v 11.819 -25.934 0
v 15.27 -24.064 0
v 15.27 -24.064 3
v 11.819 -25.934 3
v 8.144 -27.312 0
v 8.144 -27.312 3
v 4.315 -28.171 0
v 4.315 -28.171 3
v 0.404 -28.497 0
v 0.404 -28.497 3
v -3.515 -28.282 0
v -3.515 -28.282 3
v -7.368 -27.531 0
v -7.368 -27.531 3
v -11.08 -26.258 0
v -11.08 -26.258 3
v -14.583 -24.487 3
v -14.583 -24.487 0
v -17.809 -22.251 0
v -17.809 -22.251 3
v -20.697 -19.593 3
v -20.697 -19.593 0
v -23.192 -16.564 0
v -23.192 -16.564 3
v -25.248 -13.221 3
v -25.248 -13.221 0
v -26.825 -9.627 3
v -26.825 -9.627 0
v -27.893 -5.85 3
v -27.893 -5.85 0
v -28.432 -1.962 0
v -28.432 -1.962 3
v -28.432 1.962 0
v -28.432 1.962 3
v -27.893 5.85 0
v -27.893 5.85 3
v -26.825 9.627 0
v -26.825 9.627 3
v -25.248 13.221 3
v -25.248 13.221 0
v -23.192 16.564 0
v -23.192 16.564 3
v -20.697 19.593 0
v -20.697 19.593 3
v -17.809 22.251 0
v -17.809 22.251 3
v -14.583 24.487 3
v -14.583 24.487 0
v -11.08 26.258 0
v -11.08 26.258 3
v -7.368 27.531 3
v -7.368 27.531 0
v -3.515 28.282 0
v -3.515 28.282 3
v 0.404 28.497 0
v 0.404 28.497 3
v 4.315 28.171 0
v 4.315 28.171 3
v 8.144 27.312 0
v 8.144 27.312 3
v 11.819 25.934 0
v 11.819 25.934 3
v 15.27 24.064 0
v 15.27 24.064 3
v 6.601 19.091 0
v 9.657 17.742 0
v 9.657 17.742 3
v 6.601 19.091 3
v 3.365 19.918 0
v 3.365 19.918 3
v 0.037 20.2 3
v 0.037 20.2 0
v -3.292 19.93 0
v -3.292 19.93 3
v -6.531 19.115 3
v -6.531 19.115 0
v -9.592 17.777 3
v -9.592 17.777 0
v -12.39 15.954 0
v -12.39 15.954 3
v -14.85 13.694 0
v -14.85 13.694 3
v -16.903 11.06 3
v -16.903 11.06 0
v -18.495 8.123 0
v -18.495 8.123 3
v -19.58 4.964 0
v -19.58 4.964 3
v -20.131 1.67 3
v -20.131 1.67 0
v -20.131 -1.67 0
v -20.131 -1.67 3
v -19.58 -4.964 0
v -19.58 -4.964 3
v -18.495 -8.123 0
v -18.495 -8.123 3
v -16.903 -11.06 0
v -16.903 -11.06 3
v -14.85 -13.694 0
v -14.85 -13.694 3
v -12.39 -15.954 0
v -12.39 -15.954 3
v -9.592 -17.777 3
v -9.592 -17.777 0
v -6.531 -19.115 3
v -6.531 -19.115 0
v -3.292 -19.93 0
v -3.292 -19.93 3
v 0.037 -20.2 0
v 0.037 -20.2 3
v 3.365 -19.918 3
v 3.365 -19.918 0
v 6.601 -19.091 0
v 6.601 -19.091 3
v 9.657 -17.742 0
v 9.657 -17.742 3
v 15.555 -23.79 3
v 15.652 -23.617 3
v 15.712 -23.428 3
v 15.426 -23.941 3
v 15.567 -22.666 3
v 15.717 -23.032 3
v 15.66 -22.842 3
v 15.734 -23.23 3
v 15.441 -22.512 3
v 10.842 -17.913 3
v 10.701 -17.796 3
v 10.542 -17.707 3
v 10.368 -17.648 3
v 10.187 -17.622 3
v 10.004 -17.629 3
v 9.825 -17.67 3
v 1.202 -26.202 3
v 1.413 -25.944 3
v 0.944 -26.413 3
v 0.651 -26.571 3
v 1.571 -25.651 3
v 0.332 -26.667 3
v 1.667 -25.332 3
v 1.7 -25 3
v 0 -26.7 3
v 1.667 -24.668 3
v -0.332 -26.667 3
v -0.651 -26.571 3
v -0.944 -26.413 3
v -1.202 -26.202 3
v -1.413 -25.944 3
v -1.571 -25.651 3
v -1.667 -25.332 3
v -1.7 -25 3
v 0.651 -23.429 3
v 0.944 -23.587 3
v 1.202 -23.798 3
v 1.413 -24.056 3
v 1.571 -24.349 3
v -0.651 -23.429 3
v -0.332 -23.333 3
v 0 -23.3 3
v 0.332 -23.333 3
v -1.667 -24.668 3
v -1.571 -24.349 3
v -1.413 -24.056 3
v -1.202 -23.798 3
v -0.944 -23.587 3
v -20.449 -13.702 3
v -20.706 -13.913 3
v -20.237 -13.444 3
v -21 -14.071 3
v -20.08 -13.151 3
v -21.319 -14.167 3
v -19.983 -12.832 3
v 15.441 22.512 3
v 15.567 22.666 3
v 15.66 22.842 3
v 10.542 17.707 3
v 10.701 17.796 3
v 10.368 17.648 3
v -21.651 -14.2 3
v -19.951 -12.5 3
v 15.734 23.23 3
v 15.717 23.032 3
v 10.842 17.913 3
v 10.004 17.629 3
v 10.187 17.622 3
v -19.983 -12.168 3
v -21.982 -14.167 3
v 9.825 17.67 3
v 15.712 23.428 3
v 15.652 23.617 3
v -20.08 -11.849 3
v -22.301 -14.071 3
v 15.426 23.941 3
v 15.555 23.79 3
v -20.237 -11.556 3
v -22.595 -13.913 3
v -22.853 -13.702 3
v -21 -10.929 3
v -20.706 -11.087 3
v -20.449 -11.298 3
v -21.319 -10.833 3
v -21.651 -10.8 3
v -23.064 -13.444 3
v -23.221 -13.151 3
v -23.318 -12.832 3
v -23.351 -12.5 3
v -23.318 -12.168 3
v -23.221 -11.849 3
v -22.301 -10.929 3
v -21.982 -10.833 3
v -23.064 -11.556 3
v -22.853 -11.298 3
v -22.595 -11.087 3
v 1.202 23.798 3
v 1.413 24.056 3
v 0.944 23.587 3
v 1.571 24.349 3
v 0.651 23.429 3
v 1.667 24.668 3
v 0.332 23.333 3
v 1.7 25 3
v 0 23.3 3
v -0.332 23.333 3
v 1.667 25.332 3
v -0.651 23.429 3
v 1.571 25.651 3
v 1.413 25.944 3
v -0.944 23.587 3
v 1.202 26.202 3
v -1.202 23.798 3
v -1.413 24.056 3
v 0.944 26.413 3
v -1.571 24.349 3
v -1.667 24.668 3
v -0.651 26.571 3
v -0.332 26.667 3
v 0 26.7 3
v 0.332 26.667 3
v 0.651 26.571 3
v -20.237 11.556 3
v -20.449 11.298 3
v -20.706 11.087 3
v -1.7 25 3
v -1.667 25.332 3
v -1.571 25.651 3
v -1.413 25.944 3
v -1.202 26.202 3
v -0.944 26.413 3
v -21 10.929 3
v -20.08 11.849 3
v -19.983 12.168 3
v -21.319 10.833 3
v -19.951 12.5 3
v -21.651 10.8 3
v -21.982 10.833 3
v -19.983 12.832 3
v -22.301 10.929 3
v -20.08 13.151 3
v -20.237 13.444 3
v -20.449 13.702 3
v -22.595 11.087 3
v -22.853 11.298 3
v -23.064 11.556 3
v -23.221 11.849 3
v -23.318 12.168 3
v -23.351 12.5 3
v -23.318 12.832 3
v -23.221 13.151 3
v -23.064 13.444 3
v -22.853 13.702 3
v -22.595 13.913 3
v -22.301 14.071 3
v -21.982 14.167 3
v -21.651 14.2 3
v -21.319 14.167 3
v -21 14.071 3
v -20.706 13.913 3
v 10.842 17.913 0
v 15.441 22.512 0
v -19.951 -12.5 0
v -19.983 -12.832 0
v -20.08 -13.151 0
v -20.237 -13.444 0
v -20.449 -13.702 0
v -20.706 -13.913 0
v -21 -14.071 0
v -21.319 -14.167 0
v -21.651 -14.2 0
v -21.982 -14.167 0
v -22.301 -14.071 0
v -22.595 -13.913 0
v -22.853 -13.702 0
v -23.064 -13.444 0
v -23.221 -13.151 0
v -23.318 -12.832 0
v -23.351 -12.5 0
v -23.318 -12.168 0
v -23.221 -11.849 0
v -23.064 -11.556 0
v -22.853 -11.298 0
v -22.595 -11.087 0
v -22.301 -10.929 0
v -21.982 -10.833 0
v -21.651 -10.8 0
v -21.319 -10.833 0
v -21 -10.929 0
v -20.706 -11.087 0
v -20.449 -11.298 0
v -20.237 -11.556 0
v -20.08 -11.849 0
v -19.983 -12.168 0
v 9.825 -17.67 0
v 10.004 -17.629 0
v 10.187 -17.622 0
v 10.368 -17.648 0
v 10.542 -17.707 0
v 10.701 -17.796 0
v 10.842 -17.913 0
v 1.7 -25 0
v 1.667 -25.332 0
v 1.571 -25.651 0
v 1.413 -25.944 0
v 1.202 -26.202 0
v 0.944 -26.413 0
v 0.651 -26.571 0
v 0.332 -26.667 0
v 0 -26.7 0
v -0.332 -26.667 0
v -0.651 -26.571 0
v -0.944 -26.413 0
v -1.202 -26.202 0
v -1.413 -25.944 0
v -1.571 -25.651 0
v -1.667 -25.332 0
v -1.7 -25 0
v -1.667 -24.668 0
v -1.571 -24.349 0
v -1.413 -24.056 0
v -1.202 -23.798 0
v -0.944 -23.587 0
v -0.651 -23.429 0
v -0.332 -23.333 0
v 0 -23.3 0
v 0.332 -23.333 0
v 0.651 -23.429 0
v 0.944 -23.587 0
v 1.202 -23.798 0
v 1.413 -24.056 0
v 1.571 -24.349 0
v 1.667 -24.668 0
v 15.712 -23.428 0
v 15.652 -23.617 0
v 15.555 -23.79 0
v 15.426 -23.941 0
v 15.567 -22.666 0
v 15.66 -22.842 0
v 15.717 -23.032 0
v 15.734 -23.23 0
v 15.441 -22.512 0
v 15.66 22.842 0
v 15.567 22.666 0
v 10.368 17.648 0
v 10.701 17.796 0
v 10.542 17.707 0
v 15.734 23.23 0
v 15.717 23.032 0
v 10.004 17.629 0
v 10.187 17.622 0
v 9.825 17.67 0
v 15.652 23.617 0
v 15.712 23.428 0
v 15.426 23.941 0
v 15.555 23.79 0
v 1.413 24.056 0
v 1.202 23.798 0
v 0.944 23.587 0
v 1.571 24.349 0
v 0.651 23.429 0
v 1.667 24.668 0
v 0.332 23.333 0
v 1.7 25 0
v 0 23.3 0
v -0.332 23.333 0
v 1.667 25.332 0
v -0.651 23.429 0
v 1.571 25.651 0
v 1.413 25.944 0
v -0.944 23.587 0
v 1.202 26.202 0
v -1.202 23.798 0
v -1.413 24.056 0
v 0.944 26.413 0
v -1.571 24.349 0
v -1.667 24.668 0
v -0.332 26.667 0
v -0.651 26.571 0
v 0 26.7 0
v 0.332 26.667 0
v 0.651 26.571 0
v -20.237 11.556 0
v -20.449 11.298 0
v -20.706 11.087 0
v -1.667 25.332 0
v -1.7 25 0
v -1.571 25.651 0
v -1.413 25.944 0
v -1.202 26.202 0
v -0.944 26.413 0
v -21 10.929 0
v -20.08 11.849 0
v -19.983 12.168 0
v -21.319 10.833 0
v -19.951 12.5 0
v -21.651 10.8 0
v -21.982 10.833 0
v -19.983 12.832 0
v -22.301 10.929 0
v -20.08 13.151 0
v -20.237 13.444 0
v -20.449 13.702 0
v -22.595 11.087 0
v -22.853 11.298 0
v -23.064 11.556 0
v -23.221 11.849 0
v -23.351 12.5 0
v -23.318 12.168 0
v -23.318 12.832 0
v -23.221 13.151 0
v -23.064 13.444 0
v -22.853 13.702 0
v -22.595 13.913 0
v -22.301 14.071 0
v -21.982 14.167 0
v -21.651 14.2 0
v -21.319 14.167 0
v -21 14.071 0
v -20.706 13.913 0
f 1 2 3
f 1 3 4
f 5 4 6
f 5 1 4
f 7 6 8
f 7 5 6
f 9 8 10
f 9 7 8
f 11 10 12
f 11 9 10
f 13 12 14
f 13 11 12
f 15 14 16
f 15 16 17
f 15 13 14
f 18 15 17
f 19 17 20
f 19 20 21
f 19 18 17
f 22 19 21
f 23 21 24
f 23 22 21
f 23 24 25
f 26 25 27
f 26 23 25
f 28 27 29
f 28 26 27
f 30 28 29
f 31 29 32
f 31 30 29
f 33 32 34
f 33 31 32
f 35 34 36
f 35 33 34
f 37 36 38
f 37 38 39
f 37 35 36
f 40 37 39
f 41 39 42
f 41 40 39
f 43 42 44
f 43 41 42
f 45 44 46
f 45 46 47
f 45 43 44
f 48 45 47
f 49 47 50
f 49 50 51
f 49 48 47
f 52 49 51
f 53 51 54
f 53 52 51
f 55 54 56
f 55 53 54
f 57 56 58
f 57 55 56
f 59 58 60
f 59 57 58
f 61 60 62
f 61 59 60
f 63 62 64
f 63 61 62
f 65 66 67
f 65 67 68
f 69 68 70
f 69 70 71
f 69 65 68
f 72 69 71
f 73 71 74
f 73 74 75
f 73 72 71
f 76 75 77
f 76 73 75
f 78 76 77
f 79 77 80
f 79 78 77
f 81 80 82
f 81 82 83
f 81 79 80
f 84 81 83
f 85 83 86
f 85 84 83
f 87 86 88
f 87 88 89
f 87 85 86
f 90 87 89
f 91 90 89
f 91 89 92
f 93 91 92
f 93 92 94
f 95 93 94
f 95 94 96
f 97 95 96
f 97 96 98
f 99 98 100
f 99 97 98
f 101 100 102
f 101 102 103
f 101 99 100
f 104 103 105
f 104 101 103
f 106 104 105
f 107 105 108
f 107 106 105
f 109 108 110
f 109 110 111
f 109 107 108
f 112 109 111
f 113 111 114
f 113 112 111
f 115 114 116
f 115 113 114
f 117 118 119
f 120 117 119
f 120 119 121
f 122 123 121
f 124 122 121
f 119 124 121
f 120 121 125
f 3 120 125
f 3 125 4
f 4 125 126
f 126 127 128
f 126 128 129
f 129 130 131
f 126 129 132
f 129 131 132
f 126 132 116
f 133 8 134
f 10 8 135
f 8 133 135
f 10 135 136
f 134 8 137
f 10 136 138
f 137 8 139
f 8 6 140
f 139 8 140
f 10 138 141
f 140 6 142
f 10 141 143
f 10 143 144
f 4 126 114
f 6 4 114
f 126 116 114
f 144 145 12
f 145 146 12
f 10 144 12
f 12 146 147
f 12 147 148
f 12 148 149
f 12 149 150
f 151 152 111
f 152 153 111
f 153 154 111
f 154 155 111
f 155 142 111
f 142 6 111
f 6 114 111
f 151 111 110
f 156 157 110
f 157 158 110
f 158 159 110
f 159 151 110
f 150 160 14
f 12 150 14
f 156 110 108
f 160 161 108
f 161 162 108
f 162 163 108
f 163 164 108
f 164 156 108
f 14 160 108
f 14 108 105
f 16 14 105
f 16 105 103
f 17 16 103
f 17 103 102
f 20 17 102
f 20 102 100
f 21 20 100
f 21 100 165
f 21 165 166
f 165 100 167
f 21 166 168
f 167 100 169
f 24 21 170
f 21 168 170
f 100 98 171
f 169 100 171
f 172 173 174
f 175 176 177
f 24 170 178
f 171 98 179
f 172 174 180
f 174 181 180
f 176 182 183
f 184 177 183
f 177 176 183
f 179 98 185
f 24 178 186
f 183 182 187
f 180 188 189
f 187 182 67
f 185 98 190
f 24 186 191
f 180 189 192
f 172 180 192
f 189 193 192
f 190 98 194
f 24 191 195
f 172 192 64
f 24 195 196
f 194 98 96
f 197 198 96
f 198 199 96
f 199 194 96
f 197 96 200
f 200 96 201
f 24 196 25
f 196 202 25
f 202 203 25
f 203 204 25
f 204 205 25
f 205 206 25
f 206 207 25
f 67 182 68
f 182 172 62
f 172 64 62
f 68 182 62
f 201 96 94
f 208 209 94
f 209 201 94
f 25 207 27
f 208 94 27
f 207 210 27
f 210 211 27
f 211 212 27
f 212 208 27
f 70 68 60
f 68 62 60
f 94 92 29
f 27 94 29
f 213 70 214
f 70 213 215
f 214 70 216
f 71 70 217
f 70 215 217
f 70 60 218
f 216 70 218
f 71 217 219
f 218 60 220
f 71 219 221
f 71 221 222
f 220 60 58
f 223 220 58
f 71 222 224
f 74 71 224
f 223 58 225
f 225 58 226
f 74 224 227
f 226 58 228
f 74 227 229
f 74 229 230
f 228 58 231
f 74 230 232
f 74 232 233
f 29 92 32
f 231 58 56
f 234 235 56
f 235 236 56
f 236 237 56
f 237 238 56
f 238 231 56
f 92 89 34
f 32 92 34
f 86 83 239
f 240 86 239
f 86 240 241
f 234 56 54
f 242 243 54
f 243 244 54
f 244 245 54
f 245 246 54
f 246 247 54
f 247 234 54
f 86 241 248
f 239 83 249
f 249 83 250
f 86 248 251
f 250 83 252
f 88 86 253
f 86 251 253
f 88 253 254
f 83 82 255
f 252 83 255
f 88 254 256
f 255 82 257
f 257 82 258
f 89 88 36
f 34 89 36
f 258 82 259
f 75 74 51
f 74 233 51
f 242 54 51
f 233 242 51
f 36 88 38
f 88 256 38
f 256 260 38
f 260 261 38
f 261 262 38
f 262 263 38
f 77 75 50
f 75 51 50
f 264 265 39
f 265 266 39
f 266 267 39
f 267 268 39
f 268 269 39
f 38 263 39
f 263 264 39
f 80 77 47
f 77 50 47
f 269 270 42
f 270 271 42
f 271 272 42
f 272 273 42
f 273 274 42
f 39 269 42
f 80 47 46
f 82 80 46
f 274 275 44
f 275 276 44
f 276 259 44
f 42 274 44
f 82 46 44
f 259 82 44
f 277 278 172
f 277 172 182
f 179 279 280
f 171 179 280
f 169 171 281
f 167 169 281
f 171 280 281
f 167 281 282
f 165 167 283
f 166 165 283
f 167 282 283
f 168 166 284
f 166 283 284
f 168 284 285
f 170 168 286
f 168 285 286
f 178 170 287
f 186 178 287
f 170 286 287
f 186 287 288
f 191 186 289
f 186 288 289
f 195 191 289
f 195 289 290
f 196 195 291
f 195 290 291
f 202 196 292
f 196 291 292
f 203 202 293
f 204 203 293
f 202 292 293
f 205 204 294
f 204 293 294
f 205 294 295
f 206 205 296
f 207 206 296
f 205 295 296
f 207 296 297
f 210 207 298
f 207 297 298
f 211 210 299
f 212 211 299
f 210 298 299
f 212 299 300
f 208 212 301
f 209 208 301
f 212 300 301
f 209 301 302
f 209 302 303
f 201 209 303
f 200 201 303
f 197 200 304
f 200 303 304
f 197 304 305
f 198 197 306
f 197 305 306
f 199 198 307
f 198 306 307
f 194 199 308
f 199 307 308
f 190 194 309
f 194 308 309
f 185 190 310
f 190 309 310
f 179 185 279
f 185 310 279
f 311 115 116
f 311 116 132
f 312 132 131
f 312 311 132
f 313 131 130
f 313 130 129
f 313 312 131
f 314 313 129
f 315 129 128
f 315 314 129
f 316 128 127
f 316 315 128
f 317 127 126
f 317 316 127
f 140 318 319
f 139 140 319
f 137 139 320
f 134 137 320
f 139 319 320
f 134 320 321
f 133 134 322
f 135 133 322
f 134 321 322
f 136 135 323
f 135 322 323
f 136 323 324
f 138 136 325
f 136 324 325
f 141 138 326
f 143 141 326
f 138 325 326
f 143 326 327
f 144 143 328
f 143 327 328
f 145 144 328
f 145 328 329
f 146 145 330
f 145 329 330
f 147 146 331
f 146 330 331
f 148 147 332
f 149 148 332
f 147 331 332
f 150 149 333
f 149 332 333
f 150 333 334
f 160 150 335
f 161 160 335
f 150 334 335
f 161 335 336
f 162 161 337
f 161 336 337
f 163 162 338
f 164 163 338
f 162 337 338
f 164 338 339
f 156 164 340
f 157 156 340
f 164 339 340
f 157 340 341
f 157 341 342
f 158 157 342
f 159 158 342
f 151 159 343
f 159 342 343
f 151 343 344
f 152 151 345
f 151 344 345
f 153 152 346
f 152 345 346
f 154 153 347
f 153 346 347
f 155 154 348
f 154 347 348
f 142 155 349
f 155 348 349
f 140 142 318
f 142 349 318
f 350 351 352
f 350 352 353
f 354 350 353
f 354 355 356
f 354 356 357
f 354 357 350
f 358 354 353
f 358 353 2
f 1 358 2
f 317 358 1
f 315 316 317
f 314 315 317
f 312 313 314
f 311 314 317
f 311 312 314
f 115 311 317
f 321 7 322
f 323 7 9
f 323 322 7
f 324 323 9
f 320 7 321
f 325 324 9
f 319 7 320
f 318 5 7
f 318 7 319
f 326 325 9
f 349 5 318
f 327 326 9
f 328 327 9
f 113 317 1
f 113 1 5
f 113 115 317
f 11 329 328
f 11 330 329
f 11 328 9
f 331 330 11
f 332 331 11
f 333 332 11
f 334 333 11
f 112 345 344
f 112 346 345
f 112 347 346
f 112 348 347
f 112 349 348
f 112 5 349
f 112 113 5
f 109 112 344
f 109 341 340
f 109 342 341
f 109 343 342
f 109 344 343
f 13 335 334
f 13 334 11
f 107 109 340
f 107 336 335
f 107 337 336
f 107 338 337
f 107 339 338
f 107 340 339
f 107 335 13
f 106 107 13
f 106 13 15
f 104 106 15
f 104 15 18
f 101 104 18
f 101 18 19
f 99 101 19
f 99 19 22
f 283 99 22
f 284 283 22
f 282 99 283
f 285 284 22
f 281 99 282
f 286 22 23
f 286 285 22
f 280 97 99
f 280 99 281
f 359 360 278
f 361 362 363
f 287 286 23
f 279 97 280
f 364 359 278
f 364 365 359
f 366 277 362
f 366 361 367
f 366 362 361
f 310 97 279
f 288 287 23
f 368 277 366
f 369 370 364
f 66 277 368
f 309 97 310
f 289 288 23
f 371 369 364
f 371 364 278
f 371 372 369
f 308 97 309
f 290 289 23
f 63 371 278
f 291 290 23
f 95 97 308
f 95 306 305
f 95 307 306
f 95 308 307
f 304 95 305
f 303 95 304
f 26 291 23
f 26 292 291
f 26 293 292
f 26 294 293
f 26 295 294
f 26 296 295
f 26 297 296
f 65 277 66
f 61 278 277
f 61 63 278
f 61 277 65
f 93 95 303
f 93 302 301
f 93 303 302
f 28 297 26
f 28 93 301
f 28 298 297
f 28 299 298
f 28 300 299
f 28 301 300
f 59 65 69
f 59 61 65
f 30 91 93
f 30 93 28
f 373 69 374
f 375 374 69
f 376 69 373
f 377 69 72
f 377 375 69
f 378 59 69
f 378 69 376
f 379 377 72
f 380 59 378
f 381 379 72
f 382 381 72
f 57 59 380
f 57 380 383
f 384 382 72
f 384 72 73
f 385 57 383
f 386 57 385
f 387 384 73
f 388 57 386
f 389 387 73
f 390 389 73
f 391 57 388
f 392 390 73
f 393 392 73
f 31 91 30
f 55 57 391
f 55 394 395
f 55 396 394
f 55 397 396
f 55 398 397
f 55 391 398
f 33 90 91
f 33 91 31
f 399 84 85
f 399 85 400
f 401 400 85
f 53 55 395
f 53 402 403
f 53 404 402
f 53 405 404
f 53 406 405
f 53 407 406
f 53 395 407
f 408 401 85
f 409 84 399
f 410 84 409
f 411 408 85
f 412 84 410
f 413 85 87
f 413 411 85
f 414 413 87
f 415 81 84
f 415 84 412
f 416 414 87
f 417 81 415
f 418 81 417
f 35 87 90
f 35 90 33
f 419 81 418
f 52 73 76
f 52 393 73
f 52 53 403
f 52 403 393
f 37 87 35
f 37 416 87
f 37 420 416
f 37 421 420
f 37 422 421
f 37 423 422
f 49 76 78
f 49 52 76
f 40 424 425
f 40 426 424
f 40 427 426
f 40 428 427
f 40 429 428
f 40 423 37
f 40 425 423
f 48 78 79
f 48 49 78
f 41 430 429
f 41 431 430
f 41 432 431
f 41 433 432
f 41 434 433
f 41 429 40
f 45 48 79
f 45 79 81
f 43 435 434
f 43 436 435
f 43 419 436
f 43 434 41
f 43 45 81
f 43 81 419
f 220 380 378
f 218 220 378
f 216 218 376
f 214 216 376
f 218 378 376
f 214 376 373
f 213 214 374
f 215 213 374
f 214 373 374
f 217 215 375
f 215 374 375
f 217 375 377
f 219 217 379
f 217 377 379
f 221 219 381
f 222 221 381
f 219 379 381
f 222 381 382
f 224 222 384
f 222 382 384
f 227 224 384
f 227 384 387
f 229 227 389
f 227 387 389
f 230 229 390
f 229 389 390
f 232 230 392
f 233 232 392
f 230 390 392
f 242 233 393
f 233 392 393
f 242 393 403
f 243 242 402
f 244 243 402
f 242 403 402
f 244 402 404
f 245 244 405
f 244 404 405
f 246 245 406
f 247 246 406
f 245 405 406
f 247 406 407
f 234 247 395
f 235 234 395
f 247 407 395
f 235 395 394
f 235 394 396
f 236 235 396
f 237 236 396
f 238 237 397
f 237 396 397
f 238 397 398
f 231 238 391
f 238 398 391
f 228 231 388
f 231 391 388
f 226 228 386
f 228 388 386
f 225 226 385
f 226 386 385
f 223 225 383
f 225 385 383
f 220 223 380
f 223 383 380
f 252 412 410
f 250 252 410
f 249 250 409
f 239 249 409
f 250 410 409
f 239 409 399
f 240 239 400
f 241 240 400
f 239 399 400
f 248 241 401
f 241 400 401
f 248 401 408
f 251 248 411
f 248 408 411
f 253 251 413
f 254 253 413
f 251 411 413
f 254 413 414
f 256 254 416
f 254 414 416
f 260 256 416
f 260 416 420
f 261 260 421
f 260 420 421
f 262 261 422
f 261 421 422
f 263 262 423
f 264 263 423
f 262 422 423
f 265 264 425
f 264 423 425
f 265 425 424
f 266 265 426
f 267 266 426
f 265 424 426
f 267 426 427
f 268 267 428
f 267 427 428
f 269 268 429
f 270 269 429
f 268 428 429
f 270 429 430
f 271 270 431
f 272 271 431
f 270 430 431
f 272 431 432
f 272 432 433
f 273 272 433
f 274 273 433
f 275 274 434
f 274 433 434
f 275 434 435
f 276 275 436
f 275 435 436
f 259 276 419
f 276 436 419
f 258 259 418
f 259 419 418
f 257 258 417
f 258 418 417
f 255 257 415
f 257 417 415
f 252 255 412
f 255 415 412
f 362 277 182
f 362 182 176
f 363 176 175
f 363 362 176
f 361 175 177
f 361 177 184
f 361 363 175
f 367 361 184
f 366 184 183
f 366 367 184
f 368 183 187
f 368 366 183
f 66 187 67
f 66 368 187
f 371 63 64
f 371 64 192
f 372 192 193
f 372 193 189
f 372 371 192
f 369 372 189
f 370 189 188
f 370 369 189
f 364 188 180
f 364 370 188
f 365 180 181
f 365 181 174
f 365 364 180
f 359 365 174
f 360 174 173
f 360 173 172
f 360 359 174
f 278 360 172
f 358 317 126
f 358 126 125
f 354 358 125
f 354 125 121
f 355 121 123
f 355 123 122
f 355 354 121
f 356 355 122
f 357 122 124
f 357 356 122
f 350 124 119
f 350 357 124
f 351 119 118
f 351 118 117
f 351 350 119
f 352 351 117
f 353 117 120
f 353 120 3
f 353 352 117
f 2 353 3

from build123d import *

# Parameters (mm, degrees)
SKETCH_1_R      = 1.7
EXTRUDE_1_DEPTH = 3


with BuildPart() as part:
    # 草图1 → 凸台-拉伸1 (new body)
    with BuildSketch(Plane(origin=(0, 0, 0), x_dir=(-1, 0, 0), z_dir=(0, 0, -1))):
        with BuildLine():
            Line((-15.441425808, 22.51249362), (-10.842226699, 17.91329451))
            ThreePointArc((-10.842226699, 17.91329451), (-10.278098339, 17.630675486), (-9.657048223, 17.742080476))
            ThreePointArc((-9.657048223, 17.742080476), (20.2, 0), (-9.657048223, -17.742080476))
            ThreePointArc((-9.657048223, -17.742080476), (-10.278098339, -17.630675486), (-10.842226699, -17.91329451))
            Line((-10.842226699, -17.91329451), (-15.441425808, -22.51249362))
            ThreePointArc((-15.441425808, -22.51249362), (-15.728277814, -23.329354358), (-15.270112446, -24.063949507))
            ThreePointArc((-15.270112446, -24.063949507), (28.5, 0), (-15.270112446, 24.063949507))
            ThreePointArc((-15.270112446, 24.063949507), (-15.728277814, 23.329354358), (-15.441425808, 22.51249362))
        make_face()
        with Locations(Location((0, 25, 0), (0, 0, 180))):
            Circle(SKETCH_1_R, mode=Mode.SUBTRACT)
        with Locations(Location((0, -25, 0), (0, 0, 180))):
            Circle(SKETCH_1_R, mode=Mode.SUBTRACT)
        with Locations(Location((21.650635095, 12.5, 0), (0, 0, 180))):
            Circle(SKETCH_1_R, mode=Mode.SUBTRACT)
        with Locations(Location((21.650635095, -12.5, 0), (0, 0, 180))):
            Circle(SKETCH_1_R, mode=Mode.SUBTRACT)
    extrude(amount=-EXTRUDE_1_DEPTH)


solid = part.part
